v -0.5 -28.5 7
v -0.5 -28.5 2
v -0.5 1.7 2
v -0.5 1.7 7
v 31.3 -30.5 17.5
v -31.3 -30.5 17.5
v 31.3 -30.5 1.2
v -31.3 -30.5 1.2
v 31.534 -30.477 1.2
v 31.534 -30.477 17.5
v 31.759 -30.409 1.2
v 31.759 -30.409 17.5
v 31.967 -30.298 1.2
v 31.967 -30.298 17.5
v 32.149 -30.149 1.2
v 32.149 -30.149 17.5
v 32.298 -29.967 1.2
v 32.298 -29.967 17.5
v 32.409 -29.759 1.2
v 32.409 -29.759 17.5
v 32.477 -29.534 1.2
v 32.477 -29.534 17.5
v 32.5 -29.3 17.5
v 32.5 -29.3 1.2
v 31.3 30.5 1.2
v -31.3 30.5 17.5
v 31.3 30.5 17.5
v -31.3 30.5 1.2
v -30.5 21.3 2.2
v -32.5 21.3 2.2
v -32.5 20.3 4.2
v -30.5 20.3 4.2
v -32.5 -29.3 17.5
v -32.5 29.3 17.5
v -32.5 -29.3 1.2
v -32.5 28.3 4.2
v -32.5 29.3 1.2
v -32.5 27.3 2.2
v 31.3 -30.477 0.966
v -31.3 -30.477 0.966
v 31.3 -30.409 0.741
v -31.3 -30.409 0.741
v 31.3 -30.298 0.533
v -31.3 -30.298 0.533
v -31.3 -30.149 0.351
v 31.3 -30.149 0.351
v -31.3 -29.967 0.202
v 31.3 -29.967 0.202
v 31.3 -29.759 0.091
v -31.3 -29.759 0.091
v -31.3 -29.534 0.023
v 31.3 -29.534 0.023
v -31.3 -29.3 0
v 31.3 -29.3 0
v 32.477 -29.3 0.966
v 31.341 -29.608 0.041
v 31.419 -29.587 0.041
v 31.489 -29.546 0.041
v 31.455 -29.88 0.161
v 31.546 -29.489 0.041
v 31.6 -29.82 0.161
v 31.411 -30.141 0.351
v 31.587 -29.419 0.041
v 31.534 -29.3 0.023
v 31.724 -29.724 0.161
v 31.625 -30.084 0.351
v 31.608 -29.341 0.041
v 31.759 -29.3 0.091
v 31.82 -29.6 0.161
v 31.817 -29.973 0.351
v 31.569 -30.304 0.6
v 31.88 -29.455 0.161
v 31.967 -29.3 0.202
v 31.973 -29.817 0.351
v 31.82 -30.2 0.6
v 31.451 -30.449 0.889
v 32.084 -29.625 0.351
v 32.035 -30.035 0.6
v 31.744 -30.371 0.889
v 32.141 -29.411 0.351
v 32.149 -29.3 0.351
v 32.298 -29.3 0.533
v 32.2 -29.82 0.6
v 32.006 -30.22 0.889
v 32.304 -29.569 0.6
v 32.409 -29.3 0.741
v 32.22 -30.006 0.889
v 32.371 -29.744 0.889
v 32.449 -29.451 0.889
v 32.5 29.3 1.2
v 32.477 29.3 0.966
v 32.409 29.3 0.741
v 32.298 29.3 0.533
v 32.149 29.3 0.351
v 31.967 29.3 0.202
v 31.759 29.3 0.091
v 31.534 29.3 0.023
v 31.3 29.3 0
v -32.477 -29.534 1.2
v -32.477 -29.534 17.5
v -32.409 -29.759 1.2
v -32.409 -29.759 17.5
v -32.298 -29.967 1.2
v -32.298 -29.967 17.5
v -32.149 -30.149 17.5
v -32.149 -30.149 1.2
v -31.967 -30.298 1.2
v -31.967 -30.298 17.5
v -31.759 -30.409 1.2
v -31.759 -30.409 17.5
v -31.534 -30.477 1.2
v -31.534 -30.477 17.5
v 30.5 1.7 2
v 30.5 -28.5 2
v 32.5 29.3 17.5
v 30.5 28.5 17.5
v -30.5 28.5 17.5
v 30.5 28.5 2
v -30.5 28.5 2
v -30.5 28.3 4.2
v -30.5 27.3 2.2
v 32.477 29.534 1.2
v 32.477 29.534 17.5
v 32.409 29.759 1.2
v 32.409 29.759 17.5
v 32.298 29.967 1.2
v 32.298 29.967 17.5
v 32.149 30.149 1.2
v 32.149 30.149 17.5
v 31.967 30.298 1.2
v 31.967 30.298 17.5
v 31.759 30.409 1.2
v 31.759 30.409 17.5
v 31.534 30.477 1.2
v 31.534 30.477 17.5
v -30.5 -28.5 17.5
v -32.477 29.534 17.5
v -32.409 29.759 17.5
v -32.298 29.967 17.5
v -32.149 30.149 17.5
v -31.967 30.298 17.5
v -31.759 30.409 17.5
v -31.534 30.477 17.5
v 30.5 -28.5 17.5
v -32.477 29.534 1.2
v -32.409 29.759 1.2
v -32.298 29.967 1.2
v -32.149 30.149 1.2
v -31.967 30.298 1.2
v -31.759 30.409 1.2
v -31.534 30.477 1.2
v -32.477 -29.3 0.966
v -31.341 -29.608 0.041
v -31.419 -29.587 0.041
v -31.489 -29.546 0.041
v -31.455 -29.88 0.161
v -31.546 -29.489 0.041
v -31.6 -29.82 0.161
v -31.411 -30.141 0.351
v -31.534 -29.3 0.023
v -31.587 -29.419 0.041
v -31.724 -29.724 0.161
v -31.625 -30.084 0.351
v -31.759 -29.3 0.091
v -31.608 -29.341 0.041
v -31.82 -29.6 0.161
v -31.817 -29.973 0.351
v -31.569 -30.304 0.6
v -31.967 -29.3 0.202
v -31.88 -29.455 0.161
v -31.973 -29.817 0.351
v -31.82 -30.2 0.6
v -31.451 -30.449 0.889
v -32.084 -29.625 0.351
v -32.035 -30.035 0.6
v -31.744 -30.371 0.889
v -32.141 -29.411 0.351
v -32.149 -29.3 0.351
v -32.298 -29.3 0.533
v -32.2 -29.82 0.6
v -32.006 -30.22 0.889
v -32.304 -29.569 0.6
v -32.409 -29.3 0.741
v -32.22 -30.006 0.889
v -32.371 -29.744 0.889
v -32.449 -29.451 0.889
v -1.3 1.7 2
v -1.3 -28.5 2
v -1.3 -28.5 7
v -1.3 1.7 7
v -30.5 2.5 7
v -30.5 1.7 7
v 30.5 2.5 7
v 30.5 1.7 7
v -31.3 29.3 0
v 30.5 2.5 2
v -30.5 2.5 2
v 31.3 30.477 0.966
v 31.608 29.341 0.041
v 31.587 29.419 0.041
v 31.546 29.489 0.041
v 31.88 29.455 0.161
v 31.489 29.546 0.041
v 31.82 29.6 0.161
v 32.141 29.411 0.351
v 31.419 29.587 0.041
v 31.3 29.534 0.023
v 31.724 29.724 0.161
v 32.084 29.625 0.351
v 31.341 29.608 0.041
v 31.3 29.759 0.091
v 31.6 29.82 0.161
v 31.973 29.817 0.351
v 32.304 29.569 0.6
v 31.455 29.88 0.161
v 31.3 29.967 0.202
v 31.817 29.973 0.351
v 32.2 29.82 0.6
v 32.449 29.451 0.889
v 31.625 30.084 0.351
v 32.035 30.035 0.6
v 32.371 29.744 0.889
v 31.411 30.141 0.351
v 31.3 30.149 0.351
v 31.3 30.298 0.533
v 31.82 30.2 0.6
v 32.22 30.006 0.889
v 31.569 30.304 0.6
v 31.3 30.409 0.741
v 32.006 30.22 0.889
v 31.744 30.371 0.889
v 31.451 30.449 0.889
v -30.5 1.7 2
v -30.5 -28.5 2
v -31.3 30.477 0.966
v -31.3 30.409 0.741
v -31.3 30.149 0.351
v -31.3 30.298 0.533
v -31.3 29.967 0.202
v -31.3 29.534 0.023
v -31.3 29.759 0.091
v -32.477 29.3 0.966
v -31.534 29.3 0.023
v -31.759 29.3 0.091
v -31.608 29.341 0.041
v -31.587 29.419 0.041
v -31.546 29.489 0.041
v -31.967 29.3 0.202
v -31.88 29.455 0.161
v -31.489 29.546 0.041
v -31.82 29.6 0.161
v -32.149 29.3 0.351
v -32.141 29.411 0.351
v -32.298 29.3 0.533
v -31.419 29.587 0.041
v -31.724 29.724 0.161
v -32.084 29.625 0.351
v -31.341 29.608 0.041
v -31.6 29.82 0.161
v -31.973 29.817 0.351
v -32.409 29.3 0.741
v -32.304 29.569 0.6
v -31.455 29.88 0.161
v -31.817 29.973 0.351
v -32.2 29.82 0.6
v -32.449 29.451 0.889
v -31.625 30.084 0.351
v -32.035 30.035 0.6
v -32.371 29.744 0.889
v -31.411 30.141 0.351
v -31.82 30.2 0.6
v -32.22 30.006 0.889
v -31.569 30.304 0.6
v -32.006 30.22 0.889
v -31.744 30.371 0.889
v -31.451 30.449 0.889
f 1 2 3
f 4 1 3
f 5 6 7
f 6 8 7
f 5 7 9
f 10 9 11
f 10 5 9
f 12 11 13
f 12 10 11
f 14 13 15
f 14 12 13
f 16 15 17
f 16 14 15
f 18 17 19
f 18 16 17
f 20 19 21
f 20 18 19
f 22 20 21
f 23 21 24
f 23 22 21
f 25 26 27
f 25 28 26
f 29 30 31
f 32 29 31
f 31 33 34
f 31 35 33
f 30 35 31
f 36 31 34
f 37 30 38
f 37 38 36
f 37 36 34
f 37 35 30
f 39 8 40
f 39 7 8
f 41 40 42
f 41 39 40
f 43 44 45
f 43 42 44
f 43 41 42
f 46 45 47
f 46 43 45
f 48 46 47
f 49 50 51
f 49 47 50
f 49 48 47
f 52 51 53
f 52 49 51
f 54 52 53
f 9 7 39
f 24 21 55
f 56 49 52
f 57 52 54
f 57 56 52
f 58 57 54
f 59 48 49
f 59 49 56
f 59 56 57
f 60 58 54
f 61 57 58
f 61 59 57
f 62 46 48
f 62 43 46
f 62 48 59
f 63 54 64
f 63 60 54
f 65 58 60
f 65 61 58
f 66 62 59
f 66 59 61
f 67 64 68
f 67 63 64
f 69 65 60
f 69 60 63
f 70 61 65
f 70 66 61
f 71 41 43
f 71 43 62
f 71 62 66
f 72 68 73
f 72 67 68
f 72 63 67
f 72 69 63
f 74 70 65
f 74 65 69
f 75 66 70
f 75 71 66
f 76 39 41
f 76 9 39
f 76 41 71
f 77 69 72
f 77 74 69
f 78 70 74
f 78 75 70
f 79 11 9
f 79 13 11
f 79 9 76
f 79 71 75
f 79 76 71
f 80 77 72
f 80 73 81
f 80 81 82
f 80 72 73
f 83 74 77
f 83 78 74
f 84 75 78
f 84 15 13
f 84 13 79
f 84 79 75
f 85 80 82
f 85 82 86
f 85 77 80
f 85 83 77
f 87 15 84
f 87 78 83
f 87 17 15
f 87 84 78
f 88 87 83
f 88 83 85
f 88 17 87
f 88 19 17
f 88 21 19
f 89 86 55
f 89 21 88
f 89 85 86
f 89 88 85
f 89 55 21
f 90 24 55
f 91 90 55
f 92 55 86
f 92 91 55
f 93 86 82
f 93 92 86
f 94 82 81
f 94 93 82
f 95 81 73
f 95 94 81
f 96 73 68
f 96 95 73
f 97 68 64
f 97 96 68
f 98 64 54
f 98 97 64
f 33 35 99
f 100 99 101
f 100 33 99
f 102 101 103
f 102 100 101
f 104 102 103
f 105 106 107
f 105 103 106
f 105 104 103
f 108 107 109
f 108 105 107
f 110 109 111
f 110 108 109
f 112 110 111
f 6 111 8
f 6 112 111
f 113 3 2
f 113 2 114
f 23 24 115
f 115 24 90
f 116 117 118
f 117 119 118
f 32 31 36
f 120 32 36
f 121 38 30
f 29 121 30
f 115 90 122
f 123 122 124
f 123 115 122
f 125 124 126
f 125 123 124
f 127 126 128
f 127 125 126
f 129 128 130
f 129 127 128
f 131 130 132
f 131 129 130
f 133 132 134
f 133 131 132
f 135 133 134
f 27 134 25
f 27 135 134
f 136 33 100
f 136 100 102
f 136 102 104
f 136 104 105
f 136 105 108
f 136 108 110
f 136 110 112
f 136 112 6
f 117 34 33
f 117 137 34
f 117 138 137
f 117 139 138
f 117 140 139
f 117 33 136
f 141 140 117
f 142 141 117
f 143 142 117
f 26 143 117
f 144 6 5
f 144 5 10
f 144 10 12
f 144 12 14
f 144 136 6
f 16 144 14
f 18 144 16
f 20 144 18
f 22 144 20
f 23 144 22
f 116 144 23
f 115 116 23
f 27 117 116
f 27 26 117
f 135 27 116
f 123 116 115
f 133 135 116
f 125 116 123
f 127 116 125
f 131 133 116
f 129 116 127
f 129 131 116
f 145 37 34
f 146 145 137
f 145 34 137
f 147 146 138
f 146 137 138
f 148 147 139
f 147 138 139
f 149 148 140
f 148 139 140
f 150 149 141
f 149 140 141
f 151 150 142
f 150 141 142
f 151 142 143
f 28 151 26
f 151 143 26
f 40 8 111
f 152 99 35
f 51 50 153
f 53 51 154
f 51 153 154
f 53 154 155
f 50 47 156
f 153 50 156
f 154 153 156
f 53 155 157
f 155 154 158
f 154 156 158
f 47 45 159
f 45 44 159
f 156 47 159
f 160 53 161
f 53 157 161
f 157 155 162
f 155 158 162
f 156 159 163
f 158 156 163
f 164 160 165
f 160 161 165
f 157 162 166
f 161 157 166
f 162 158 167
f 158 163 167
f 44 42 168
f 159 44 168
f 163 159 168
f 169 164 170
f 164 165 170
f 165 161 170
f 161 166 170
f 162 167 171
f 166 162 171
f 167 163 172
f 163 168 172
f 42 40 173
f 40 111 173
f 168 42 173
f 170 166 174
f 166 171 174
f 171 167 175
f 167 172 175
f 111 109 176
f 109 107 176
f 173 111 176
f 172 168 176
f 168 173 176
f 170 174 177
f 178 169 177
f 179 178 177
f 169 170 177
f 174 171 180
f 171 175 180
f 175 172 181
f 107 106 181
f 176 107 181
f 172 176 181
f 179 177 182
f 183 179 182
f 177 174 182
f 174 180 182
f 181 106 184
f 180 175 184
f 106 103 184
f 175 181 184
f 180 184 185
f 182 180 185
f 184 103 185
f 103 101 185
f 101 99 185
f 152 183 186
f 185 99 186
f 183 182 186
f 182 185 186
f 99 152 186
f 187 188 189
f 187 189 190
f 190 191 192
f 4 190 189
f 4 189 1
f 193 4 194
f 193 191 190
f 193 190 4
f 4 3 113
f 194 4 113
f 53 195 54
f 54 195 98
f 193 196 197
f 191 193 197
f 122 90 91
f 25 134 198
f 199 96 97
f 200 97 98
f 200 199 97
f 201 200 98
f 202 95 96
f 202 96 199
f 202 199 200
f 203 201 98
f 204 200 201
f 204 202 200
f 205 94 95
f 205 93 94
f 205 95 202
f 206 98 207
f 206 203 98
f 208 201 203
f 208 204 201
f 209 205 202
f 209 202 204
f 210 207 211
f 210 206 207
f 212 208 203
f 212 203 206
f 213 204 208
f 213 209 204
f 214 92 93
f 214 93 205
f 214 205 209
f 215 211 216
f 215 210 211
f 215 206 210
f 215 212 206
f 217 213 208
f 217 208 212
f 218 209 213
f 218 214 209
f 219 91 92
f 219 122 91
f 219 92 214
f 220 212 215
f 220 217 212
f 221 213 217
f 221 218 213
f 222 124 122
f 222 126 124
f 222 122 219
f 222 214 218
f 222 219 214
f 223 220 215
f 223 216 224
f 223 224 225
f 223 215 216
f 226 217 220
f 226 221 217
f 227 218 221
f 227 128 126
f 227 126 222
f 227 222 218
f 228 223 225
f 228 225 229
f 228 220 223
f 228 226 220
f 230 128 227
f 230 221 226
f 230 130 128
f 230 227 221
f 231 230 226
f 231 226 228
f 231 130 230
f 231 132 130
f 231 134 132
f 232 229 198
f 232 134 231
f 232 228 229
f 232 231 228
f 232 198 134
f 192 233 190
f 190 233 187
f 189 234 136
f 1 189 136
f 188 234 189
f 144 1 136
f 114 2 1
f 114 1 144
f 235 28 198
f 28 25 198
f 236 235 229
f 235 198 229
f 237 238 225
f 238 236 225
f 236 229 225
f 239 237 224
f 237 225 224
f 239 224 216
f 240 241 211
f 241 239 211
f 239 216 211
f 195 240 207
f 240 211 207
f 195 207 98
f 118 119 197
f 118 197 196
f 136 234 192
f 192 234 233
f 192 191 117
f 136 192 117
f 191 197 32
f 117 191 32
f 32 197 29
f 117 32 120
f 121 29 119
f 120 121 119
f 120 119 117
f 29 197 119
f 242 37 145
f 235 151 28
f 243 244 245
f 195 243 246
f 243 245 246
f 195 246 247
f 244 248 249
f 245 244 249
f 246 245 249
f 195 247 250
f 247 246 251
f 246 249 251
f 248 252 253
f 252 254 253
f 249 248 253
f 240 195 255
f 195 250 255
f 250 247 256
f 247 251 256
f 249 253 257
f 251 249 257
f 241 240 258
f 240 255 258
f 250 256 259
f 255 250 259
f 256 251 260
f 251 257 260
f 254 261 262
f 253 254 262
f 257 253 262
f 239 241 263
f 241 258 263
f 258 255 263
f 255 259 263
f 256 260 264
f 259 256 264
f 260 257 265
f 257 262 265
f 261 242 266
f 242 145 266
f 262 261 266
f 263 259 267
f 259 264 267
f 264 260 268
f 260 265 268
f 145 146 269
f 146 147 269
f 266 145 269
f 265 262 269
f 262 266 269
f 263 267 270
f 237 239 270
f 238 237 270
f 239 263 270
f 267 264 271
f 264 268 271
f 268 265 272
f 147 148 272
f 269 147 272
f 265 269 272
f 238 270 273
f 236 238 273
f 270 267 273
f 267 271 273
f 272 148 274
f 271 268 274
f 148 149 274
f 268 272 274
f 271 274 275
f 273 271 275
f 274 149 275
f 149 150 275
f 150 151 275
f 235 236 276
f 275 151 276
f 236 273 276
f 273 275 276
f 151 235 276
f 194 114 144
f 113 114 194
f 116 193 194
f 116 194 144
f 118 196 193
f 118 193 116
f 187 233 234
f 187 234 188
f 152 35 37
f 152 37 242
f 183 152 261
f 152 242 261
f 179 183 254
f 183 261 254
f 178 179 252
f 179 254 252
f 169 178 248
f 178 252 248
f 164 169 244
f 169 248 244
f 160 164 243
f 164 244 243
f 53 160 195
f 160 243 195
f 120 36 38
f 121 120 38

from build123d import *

# Parameters (mm, degrees)
F0_W     = 65
F0_H     = 61
F1_DEPTH = 17.5
F2_T     = -2
F3_R     = 1.2
F4_W     = 0.8
F4_H     = 30.2
F5_DEPTH = 5
F7_DEPTH = 2


with BuildPart() as f1:
    # F0 (on Top) → F1 (new body)
    with BuildSketch(Plane.XY):
        Rectangle(F0_W, F0_H)
    extrude(amount=F1_DEPTH)

    # F2
    f2_openings = [f1.faces().sort_by_distance(p)[0] for p in [
        (0, 0, 17.5),
    ]]
    offset(amount=F2_T, openings=f2_openings)

    # F3
    f3_edges = [f1.edges().sort_by_distance(p)[0] for p in [
        (32.5, -30.5, 8.75),
        (32.5, 30.5, 8.75),
        (-32.5, 30.5, 8.75),
        (-32.5, -30.5, 8.75),
        (0, -30.5, 0),
        (-32.5, 0, 0),
        (32.5, 0, 0),
        (0, 30.5, 0),
    ]]
    fillet(f3_edges, radius=F3_R)

    # F4 (on face) → F5 (join)
    with BuildSketch(Plane.XY.offset(2)):
        Polygon((30.5, 2.5), (-30.5, 2.5), (-30.5, 1.7), (-1.3, 1.7), (-0.5, 1.7), (30.5, 1.7), align=None)
        with Locations((-0.9, -13.4)):
            Rectangle(F4_W, F4_H)
    extrude(amount=F5_DEPTH)

    # F6 (on face) → F7 (cut, through all)
    with BuildSketch(Plane(origin=(-32.5, 0, 0), x_dir=(0, -1, 0), z_dir=(-1, 0, 0))):
        Polygon((-20.3, 4.2), (-28.3, 4.2), (-27.3, 2.2), (-21.3, 2.2), align=None)
    extrude(amount=-F7_DEPTH, mode=Mode.SUBTRACT)


solid = f1.part
